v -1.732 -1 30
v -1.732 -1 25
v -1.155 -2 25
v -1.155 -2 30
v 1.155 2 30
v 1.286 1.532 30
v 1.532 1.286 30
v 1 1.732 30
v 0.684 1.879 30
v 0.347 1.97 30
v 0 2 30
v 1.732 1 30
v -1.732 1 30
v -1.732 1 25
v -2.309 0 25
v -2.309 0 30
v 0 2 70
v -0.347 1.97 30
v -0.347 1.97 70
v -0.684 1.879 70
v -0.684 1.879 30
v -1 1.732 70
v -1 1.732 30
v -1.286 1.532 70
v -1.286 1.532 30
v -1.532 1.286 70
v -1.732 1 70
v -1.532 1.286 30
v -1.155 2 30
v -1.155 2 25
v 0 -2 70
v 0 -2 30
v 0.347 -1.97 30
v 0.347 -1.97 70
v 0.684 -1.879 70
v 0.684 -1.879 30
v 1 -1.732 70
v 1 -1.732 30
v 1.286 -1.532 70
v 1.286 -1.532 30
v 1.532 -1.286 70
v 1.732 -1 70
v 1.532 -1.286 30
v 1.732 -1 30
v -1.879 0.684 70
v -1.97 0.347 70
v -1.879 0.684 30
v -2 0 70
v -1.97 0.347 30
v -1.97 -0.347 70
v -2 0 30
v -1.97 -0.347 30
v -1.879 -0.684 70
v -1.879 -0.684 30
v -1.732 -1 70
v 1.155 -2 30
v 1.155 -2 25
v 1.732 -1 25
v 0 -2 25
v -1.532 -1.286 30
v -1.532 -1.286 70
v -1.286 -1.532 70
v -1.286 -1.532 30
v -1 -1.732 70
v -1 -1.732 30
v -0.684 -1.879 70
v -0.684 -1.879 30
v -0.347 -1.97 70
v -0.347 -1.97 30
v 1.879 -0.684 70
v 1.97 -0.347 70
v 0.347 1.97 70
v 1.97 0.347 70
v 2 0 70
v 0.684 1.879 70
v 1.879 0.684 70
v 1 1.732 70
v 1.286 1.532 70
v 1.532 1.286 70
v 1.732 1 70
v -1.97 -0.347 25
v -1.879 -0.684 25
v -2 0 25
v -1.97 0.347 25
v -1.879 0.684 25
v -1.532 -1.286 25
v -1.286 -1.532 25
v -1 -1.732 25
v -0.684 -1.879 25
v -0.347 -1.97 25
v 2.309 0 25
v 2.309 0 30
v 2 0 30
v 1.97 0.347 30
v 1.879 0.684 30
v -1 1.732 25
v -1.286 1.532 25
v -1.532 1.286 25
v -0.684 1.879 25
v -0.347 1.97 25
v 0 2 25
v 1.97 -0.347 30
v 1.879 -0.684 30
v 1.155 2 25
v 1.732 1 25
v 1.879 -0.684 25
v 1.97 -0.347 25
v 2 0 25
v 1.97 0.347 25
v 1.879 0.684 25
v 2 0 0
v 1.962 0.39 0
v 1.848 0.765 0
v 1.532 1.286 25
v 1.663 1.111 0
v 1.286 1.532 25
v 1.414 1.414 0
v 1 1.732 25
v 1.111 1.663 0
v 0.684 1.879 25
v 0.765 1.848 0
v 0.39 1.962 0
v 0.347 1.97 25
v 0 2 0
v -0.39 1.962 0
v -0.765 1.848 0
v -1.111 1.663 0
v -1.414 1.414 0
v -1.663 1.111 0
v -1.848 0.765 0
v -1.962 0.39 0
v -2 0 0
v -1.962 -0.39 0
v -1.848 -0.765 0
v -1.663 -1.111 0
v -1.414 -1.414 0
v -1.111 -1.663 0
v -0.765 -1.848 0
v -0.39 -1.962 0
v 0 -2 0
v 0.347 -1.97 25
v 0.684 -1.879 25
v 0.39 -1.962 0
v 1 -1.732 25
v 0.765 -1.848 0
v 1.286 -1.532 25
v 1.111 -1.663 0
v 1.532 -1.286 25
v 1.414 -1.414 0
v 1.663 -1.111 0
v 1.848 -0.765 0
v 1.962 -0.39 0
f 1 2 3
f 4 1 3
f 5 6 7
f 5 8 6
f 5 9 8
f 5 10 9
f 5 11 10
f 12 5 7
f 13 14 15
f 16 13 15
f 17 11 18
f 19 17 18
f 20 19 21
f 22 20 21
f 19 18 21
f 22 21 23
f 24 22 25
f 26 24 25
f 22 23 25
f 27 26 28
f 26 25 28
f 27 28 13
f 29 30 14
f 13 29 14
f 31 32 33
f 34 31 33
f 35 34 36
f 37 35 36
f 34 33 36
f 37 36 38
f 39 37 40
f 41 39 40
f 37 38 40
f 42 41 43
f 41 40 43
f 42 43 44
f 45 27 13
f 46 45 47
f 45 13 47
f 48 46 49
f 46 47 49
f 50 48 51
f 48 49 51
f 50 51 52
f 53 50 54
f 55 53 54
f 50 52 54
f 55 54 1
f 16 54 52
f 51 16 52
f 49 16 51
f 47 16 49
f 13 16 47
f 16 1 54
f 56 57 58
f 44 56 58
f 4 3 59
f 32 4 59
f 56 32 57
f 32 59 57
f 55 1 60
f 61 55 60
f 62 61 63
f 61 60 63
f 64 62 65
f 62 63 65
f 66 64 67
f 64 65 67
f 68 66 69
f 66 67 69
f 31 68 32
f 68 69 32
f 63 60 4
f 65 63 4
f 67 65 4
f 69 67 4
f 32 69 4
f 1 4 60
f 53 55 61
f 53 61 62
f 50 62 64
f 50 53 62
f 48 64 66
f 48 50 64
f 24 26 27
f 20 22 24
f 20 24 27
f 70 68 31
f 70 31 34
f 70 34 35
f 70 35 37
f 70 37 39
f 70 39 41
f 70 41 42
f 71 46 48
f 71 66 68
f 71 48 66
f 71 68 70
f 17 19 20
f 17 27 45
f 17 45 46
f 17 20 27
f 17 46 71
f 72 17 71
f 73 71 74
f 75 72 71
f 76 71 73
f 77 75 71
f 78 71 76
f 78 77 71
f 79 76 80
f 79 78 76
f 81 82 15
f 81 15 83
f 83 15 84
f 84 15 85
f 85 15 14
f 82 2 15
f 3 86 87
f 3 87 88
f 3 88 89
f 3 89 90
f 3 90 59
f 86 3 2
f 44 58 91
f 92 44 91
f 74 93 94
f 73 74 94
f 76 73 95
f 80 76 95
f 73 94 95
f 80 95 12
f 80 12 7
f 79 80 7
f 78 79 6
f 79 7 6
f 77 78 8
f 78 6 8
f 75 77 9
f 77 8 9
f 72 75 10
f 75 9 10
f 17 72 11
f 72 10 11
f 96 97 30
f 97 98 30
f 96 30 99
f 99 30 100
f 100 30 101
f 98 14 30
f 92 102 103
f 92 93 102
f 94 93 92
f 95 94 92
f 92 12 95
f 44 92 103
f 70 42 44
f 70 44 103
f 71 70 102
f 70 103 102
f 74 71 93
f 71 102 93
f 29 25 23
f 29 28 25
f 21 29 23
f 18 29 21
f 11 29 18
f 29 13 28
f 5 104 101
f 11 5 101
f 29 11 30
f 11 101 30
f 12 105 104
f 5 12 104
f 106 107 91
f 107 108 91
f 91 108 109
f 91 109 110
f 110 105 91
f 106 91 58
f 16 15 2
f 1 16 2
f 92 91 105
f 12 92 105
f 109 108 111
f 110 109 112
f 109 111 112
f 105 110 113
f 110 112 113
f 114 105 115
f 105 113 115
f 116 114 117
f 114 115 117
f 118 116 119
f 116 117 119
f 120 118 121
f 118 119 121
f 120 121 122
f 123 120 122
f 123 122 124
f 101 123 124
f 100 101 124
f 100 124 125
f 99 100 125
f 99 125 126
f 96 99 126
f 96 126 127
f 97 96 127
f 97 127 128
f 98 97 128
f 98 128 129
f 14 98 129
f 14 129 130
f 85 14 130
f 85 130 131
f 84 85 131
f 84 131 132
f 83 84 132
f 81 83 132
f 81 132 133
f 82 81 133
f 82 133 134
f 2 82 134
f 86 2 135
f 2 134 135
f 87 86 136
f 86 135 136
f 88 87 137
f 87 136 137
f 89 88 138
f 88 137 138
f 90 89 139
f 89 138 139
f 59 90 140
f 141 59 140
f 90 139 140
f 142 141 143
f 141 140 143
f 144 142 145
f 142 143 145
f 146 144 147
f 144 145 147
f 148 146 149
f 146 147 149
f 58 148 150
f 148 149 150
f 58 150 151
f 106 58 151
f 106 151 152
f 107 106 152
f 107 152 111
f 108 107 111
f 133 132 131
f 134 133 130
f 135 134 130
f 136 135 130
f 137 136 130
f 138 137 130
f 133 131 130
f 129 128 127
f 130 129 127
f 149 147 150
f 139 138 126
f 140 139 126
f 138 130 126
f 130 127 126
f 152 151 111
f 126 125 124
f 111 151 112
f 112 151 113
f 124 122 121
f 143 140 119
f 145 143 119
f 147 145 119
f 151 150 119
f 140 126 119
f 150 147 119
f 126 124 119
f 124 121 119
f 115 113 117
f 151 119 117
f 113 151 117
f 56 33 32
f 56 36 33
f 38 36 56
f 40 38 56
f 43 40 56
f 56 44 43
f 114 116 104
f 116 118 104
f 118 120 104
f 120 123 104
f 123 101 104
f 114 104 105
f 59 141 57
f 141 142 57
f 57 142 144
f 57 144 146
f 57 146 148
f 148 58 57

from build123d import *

# Parameters (mm, degrees)
F0_R     = 2
F1_DEPTH = 25
F3_DEPTH = 5
F5_DEPTH = 40


with BuildPart() as f1:
    # F0 (on Top) → F1 (new body)
    with BuildSketch(Plane.XY):
        Circle(F0_R)
    extrude(amount=F1_DEPTH)

    # F2 (on face) → F3 (join)
    with BuildSketch(Plane.XY.offset(25)):
        with BuildLine():
            Line((0, 2), (-1.1547005384, 2))
            Line((-1.1547005384, 2), (-1.7320507826, 1.0000000433))
            ThreePointArc((-1.7320507826, 1.0000000433), (-0.9999999783, 1.7320508201), (0, 2))
        make_face()
        with BuildLine():
            ThreePointArc((-1.7320507826, -1.0000000433), (-2, 0), (-1.7320507826, 1.0000000433))
            Line((-1.7320507826, 1.0000000433), (-2.3094010768, 0))
            Line((-2.3094010768, 0), (-1.7320507826, -1.0000000433))
        make_face()
        with BuildLine():
            ThreePointArc((0, -2), (-0.9999999783, -1.7320508201), (-1.7320507826, -1.0000000433))
            Line((-1.7320507826, -1.0000000433), (-1.1547005384, -2))
            Line((-1.1547005384, -2), (0, -2))
        make_face()
        with BuildLine():
            ThreePointArc((1.7320507983, -1.0000000161), (0.999999992, -1.7320508122), (0, -2))
            Line((0, -2), (1.1547005384, -2))
            Line((1.1547005384, -2), (1.7320507983, -1.0000000161))
        make_face()
        with BuildLine():
            Line((2.3094010768, 0), (1.7320507826, 1.0000000433))
            ThreePointArc((1.7320507826, 1.0000000433), (1.9318516461, 0.5176381144), (2, 0))
            ThreePointArc((2, 0), (1.9318516502, -0.5176380992), (1.7320507983, -1.0000000161))
            Line((1.7320507983, -1.0000000161), (2.3094010768, 0))
        make_face()
        with BuildLine():
            Line((1.1547005384, 2), (0, 2))
            ThreePointArc((0, 2), (0.9999999783, 1.7320508201), (1.7320507826, 1.0000000433))
            Line((1.7320507826, 1.0000000433), (1.1547005384, 2))
        make_face()
        with BuildLine():
            ThreePointArc((1.7320507826, 1.0000000433), (0.9999999783, 1.7320508201), (0, 2))
            ThreePointArc((0, 2), (-0.9999999783, 1.7320508201), (-1.7320507826, 1.0000000433))
            ThreePointArc((-1.7320507826, 1.0000000433), (-2, 0), (-1.7320507826, -1.0000000433))
            ThreePointArc((-1.7320507826, -1.0000000433), (-0.9999999783, -1.7320508201), (0, -2))
            ThreePointArc((0, -2), (0.999999992, -1.7320508122), (1.7320507983, -1.0000000161))
            ThreePointArc((1.7320507983, -1.0000000161), (1.9318516502, -0.5176380992), (2, 0))
            ThreePointArc((2, 0), (1.9318516461, 0.5176381144), (1.7320507826, 1.0000000433))
        make_face()
    extrude(amount=F3_DEPTH)

    # F4 (on face) → F5 (join)
    with BuildSketch(Plane.XY.offset(30)):
        with BuildLine():
            ThreePointArc((1.732050814, -0.9999999889), (1.9318516542, -0.517638084), (2, 0))
            ThreePointArc((2, 0), (1.9318516461, 0.5176381144), (1.7320507826, 1.0000000433))
            ThreePointArc((1.7320507826, 1.0000000433), (0.9999999783, 1.7320508201), (0, 2))
            ThreePointArc((0, 2), (-1.0000000056, 1.7320508044), (-1.732050814, 0.9999999889))
            ThreePointArc((-1.732050814, 0.9999999889), (-2, -3.14e-08), (-1.7320507826, -1.0000000433))
            ThreePointArc((-1.7320507826, -1.0000000433), (-0.9999999783, -1.7320508201), (0, -2))
            ThreePointArc((0, -2), (1.0000000056, -1.7320508044), (1.732050814, -0.9999999889))
        make_face()
    extrude(amount=F5_DEPTH)


solid = f1.part
